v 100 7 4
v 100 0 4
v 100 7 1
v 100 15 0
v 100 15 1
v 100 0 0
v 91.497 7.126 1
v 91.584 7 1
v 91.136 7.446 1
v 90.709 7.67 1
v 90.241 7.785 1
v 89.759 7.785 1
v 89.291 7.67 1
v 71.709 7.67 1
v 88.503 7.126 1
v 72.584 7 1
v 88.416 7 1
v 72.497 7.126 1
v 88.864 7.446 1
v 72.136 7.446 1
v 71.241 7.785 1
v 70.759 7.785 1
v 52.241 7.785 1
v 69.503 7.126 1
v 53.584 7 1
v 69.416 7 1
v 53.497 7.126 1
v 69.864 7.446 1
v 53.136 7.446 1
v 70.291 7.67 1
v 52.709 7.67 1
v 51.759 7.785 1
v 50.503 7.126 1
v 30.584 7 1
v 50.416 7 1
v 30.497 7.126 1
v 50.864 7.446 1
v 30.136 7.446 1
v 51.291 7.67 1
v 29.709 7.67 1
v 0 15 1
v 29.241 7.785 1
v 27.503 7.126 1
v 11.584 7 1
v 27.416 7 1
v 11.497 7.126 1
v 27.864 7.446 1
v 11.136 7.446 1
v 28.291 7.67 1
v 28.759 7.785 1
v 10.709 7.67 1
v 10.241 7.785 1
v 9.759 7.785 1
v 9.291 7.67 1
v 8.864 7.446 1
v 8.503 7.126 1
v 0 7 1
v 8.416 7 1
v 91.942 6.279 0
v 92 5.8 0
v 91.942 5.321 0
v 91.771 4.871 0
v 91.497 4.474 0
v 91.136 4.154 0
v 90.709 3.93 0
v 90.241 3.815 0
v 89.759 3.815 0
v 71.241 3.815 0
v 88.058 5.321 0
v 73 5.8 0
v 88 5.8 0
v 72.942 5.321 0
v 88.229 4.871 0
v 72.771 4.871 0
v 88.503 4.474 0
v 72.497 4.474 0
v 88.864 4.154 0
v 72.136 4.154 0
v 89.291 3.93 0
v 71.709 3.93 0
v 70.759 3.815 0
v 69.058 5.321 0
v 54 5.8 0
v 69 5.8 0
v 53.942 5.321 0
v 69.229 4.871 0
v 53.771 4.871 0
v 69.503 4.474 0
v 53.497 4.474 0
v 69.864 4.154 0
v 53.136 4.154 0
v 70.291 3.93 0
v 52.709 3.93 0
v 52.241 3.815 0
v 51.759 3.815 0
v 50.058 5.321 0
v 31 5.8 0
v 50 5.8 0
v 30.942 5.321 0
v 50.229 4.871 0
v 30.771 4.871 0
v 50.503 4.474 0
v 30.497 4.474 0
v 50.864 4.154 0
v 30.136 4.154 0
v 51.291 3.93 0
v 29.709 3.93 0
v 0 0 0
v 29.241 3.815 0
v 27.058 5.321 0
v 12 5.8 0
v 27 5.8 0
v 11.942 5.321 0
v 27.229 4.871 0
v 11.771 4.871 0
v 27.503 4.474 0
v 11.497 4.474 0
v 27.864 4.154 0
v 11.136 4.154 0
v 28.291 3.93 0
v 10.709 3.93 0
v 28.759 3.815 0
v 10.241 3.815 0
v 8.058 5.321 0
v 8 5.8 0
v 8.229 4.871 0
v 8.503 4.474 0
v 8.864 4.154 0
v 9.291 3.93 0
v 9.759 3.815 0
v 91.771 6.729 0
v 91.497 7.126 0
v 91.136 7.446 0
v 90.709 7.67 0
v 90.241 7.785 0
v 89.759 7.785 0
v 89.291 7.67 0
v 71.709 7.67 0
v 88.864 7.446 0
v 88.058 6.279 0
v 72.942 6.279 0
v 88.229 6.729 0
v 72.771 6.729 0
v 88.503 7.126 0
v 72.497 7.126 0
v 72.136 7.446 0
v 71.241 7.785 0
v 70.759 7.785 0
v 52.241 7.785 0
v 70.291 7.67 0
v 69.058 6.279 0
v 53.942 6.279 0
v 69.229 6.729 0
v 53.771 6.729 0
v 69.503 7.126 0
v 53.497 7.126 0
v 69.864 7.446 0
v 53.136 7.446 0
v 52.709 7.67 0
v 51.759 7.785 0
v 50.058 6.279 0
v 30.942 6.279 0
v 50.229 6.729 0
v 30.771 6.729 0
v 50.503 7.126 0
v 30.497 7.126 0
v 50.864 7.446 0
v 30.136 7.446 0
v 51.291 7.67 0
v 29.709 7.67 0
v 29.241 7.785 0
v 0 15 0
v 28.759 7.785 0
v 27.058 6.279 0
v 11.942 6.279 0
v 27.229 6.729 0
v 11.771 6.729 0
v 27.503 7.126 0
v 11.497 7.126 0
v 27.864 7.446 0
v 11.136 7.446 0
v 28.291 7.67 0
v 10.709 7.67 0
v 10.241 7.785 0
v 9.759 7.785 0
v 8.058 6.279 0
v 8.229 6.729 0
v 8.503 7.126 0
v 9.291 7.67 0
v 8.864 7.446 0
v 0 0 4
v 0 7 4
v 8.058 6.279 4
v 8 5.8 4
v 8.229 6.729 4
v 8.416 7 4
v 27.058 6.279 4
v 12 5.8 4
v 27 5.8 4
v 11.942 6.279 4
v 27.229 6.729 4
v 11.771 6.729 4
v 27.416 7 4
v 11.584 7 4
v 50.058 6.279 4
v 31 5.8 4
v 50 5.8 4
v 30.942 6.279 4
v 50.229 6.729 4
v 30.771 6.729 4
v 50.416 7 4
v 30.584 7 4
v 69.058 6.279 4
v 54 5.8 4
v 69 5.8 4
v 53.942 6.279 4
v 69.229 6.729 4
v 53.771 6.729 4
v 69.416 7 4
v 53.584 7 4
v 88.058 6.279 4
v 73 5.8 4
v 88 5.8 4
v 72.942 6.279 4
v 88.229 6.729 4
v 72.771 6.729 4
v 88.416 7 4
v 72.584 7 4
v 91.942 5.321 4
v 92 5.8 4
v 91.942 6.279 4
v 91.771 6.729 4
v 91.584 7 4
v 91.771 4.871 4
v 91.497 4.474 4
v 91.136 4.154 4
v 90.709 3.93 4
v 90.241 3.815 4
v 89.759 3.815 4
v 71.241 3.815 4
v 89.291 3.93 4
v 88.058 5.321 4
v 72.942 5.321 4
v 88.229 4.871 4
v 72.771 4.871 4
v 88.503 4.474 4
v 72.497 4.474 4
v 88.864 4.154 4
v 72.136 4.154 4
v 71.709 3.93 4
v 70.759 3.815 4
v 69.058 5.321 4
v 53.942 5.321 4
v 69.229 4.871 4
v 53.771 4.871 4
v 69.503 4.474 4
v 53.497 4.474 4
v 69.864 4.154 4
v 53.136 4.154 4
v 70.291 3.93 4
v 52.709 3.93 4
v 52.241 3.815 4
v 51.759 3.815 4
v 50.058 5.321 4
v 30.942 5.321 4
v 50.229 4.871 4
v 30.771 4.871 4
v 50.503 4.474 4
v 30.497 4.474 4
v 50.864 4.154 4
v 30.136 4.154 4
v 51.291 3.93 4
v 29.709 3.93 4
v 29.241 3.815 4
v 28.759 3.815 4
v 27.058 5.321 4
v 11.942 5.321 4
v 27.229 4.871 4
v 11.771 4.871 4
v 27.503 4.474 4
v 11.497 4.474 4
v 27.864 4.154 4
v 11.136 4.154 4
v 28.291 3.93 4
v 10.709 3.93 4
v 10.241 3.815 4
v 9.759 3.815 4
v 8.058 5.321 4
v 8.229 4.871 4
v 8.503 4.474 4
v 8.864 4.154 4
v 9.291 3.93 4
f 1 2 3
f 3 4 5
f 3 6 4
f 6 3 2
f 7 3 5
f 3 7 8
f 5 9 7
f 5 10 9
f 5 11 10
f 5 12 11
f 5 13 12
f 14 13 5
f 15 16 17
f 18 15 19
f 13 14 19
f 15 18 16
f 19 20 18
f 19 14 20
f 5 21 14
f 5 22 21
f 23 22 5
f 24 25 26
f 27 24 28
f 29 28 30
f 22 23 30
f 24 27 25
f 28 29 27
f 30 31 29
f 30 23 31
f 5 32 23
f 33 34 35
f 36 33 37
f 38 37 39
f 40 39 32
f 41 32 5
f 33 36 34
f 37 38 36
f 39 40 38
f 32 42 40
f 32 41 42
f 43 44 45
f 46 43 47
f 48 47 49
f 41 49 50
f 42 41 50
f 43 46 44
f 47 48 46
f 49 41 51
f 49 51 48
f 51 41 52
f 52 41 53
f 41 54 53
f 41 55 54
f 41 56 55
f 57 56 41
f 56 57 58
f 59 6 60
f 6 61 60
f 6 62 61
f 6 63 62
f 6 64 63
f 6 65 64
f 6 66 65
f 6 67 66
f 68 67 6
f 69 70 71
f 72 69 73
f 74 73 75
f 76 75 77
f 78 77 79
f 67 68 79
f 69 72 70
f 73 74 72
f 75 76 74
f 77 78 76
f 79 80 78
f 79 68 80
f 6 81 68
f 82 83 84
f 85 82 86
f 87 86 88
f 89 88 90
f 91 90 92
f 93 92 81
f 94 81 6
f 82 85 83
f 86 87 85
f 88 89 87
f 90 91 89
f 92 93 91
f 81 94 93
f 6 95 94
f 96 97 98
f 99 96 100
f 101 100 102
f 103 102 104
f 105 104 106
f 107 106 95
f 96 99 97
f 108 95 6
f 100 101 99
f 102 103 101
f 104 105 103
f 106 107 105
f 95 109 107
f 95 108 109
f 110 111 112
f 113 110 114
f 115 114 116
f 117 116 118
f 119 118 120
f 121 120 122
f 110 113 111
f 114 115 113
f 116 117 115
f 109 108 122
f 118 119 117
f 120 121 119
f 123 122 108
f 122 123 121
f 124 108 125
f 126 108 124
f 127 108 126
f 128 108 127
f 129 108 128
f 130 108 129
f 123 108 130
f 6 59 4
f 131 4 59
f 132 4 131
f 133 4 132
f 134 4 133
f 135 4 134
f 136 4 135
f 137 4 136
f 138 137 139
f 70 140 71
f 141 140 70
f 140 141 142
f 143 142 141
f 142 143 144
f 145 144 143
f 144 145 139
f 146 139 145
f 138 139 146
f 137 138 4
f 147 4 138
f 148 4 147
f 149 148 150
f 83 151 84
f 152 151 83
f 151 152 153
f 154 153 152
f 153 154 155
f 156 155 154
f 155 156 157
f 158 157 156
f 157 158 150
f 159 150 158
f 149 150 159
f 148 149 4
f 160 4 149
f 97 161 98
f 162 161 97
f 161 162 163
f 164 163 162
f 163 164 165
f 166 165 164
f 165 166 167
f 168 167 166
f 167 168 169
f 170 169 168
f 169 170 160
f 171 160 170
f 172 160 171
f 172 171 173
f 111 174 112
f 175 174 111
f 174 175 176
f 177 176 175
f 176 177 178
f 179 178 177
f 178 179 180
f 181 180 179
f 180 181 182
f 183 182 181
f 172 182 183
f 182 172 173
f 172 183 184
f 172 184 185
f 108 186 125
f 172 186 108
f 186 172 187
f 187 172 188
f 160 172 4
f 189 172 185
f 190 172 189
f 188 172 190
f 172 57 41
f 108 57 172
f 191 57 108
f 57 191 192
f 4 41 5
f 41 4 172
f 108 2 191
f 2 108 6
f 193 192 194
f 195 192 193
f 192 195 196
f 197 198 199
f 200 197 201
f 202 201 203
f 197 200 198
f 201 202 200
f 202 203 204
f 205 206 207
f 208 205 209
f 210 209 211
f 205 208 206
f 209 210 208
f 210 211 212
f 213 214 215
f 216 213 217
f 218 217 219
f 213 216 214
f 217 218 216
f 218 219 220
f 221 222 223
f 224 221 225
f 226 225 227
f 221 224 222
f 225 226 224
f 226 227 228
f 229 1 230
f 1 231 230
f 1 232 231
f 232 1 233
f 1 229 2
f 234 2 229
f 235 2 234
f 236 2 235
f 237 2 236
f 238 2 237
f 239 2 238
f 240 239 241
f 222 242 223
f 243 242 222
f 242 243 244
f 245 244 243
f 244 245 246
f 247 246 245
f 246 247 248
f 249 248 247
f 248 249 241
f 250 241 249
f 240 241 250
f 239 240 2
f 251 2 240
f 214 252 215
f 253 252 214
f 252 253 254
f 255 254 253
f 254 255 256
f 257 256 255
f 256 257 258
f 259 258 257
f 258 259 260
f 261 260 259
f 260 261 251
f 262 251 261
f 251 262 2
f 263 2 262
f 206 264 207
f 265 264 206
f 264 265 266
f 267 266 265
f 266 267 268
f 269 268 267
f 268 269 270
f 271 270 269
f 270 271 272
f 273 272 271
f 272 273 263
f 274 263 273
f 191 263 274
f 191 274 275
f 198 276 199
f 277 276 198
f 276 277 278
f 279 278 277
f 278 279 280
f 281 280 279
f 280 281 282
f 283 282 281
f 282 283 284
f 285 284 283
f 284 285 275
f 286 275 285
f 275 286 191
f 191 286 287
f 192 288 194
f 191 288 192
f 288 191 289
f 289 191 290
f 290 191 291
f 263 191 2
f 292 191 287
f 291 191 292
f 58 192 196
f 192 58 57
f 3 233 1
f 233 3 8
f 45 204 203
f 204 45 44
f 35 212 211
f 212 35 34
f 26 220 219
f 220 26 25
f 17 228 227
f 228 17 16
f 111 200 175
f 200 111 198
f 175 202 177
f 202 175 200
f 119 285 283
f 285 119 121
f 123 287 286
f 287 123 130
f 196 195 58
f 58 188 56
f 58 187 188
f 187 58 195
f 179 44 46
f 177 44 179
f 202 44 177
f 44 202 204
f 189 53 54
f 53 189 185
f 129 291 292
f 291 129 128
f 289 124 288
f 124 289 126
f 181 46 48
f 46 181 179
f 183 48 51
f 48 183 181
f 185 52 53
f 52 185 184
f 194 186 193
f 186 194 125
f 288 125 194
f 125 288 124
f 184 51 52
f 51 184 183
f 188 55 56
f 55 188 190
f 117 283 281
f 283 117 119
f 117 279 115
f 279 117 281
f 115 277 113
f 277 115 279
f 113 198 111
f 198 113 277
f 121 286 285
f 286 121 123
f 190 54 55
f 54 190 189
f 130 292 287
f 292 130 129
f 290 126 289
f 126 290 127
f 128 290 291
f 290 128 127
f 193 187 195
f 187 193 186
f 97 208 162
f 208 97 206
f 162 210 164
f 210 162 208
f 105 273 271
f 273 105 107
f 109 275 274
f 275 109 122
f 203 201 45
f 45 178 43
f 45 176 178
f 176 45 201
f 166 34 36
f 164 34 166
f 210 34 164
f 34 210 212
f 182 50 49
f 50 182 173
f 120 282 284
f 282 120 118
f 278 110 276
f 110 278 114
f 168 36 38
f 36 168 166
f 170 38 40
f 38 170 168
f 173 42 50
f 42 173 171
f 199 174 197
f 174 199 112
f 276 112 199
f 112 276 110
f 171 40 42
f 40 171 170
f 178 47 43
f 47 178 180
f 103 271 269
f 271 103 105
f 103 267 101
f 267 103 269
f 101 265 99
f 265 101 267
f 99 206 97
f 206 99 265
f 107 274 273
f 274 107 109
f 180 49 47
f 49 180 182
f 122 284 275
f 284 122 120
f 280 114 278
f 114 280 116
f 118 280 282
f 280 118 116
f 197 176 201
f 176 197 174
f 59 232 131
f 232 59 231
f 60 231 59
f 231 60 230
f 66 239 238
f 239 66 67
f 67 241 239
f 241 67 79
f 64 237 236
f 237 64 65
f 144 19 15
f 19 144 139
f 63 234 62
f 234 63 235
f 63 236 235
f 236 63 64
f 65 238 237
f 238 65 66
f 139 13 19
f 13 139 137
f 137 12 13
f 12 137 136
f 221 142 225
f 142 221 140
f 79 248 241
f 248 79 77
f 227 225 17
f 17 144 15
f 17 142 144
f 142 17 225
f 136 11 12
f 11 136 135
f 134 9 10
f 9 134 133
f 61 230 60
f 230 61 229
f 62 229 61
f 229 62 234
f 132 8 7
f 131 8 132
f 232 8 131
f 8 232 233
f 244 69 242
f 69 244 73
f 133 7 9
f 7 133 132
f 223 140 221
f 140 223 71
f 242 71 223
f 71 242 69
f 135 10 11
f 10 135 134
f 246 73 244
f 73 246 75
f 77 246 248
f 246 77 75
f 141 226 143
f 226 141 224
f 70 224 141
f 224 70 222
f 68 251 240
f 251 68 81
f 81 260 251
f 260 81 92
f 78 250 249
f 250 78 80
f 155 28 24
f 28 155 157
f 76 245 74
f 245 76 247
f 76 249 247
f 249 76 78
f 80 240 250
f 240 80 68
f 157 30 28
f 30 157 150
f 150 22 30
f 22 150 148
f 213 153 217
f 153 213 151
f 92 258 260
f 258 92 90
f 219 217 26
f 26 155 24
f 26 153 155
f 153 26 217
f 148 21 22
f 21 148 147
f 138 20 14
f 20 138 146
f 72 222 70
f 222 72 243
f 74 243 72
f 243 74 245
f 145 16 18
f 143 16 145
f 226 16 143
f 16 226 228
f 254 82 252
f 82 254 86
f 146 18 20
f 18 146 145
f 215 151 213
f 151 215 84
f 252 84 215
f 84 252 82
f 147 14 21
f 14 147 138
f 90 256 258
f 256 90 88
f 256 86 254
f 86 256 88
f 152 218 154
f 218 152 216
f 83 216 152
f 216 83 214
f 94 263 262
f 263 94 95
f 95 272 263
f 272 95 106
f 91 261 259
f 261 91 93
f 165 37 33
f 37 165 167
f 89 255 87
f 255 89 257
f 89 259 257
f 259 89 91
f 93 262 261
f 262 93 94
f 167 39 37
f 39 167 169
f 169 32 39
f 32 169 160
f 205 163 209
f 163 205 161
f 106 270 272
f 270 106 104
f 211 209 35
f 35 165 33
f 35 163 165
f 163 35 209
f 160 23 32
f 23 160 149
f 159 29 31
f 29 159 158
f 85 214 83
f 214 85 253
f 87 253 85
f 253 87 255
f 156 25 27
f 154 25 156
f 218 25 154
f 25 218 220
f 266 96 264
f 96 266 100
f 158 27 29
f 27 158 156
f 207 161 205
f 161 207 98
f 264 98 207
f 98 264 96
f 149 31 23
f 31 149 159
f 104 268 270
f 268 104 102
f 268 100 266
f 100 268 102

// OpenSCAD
// OpenSCAD
// mount helper for connector binding posts for autotransformer jig

$len=100;
$heig=3;
$wid=7;
$heig2=1;
$wid2=15;

$holed=4;
$holey=$wid-$holed/2+0.8;
$holeh=$heig+$heig2+1;

$holesp=19;

$holeleft=10;
$holeright=$len-10;

$fa=2;$fs=0.5;


module jig()
{
    cube([$len,$wid2,$heig2]);
    translate([0,0,$heig2])cube([$len,$wid,$heig]);
}

module jigholes()
{
    translate([$holeleft,$holey,0])cylinder(d=$holed,h=$holeh);
    translate([$holeleft+$holesp,$holey,0])cylinder(d=$holed,h=$holeh);

    translate([$holeright,$holey,0])cylinder(d=$holed,h=$holeh);
    translate([$holeright-$holesp,$holey,0])cylinder(d=$holed,h=$holeh);
    translate([$holeright-$holesp*2,$holey,0])cylinder(d=$holed,h=$holeh);
}


difference(){
jig();
jigholes();
}
